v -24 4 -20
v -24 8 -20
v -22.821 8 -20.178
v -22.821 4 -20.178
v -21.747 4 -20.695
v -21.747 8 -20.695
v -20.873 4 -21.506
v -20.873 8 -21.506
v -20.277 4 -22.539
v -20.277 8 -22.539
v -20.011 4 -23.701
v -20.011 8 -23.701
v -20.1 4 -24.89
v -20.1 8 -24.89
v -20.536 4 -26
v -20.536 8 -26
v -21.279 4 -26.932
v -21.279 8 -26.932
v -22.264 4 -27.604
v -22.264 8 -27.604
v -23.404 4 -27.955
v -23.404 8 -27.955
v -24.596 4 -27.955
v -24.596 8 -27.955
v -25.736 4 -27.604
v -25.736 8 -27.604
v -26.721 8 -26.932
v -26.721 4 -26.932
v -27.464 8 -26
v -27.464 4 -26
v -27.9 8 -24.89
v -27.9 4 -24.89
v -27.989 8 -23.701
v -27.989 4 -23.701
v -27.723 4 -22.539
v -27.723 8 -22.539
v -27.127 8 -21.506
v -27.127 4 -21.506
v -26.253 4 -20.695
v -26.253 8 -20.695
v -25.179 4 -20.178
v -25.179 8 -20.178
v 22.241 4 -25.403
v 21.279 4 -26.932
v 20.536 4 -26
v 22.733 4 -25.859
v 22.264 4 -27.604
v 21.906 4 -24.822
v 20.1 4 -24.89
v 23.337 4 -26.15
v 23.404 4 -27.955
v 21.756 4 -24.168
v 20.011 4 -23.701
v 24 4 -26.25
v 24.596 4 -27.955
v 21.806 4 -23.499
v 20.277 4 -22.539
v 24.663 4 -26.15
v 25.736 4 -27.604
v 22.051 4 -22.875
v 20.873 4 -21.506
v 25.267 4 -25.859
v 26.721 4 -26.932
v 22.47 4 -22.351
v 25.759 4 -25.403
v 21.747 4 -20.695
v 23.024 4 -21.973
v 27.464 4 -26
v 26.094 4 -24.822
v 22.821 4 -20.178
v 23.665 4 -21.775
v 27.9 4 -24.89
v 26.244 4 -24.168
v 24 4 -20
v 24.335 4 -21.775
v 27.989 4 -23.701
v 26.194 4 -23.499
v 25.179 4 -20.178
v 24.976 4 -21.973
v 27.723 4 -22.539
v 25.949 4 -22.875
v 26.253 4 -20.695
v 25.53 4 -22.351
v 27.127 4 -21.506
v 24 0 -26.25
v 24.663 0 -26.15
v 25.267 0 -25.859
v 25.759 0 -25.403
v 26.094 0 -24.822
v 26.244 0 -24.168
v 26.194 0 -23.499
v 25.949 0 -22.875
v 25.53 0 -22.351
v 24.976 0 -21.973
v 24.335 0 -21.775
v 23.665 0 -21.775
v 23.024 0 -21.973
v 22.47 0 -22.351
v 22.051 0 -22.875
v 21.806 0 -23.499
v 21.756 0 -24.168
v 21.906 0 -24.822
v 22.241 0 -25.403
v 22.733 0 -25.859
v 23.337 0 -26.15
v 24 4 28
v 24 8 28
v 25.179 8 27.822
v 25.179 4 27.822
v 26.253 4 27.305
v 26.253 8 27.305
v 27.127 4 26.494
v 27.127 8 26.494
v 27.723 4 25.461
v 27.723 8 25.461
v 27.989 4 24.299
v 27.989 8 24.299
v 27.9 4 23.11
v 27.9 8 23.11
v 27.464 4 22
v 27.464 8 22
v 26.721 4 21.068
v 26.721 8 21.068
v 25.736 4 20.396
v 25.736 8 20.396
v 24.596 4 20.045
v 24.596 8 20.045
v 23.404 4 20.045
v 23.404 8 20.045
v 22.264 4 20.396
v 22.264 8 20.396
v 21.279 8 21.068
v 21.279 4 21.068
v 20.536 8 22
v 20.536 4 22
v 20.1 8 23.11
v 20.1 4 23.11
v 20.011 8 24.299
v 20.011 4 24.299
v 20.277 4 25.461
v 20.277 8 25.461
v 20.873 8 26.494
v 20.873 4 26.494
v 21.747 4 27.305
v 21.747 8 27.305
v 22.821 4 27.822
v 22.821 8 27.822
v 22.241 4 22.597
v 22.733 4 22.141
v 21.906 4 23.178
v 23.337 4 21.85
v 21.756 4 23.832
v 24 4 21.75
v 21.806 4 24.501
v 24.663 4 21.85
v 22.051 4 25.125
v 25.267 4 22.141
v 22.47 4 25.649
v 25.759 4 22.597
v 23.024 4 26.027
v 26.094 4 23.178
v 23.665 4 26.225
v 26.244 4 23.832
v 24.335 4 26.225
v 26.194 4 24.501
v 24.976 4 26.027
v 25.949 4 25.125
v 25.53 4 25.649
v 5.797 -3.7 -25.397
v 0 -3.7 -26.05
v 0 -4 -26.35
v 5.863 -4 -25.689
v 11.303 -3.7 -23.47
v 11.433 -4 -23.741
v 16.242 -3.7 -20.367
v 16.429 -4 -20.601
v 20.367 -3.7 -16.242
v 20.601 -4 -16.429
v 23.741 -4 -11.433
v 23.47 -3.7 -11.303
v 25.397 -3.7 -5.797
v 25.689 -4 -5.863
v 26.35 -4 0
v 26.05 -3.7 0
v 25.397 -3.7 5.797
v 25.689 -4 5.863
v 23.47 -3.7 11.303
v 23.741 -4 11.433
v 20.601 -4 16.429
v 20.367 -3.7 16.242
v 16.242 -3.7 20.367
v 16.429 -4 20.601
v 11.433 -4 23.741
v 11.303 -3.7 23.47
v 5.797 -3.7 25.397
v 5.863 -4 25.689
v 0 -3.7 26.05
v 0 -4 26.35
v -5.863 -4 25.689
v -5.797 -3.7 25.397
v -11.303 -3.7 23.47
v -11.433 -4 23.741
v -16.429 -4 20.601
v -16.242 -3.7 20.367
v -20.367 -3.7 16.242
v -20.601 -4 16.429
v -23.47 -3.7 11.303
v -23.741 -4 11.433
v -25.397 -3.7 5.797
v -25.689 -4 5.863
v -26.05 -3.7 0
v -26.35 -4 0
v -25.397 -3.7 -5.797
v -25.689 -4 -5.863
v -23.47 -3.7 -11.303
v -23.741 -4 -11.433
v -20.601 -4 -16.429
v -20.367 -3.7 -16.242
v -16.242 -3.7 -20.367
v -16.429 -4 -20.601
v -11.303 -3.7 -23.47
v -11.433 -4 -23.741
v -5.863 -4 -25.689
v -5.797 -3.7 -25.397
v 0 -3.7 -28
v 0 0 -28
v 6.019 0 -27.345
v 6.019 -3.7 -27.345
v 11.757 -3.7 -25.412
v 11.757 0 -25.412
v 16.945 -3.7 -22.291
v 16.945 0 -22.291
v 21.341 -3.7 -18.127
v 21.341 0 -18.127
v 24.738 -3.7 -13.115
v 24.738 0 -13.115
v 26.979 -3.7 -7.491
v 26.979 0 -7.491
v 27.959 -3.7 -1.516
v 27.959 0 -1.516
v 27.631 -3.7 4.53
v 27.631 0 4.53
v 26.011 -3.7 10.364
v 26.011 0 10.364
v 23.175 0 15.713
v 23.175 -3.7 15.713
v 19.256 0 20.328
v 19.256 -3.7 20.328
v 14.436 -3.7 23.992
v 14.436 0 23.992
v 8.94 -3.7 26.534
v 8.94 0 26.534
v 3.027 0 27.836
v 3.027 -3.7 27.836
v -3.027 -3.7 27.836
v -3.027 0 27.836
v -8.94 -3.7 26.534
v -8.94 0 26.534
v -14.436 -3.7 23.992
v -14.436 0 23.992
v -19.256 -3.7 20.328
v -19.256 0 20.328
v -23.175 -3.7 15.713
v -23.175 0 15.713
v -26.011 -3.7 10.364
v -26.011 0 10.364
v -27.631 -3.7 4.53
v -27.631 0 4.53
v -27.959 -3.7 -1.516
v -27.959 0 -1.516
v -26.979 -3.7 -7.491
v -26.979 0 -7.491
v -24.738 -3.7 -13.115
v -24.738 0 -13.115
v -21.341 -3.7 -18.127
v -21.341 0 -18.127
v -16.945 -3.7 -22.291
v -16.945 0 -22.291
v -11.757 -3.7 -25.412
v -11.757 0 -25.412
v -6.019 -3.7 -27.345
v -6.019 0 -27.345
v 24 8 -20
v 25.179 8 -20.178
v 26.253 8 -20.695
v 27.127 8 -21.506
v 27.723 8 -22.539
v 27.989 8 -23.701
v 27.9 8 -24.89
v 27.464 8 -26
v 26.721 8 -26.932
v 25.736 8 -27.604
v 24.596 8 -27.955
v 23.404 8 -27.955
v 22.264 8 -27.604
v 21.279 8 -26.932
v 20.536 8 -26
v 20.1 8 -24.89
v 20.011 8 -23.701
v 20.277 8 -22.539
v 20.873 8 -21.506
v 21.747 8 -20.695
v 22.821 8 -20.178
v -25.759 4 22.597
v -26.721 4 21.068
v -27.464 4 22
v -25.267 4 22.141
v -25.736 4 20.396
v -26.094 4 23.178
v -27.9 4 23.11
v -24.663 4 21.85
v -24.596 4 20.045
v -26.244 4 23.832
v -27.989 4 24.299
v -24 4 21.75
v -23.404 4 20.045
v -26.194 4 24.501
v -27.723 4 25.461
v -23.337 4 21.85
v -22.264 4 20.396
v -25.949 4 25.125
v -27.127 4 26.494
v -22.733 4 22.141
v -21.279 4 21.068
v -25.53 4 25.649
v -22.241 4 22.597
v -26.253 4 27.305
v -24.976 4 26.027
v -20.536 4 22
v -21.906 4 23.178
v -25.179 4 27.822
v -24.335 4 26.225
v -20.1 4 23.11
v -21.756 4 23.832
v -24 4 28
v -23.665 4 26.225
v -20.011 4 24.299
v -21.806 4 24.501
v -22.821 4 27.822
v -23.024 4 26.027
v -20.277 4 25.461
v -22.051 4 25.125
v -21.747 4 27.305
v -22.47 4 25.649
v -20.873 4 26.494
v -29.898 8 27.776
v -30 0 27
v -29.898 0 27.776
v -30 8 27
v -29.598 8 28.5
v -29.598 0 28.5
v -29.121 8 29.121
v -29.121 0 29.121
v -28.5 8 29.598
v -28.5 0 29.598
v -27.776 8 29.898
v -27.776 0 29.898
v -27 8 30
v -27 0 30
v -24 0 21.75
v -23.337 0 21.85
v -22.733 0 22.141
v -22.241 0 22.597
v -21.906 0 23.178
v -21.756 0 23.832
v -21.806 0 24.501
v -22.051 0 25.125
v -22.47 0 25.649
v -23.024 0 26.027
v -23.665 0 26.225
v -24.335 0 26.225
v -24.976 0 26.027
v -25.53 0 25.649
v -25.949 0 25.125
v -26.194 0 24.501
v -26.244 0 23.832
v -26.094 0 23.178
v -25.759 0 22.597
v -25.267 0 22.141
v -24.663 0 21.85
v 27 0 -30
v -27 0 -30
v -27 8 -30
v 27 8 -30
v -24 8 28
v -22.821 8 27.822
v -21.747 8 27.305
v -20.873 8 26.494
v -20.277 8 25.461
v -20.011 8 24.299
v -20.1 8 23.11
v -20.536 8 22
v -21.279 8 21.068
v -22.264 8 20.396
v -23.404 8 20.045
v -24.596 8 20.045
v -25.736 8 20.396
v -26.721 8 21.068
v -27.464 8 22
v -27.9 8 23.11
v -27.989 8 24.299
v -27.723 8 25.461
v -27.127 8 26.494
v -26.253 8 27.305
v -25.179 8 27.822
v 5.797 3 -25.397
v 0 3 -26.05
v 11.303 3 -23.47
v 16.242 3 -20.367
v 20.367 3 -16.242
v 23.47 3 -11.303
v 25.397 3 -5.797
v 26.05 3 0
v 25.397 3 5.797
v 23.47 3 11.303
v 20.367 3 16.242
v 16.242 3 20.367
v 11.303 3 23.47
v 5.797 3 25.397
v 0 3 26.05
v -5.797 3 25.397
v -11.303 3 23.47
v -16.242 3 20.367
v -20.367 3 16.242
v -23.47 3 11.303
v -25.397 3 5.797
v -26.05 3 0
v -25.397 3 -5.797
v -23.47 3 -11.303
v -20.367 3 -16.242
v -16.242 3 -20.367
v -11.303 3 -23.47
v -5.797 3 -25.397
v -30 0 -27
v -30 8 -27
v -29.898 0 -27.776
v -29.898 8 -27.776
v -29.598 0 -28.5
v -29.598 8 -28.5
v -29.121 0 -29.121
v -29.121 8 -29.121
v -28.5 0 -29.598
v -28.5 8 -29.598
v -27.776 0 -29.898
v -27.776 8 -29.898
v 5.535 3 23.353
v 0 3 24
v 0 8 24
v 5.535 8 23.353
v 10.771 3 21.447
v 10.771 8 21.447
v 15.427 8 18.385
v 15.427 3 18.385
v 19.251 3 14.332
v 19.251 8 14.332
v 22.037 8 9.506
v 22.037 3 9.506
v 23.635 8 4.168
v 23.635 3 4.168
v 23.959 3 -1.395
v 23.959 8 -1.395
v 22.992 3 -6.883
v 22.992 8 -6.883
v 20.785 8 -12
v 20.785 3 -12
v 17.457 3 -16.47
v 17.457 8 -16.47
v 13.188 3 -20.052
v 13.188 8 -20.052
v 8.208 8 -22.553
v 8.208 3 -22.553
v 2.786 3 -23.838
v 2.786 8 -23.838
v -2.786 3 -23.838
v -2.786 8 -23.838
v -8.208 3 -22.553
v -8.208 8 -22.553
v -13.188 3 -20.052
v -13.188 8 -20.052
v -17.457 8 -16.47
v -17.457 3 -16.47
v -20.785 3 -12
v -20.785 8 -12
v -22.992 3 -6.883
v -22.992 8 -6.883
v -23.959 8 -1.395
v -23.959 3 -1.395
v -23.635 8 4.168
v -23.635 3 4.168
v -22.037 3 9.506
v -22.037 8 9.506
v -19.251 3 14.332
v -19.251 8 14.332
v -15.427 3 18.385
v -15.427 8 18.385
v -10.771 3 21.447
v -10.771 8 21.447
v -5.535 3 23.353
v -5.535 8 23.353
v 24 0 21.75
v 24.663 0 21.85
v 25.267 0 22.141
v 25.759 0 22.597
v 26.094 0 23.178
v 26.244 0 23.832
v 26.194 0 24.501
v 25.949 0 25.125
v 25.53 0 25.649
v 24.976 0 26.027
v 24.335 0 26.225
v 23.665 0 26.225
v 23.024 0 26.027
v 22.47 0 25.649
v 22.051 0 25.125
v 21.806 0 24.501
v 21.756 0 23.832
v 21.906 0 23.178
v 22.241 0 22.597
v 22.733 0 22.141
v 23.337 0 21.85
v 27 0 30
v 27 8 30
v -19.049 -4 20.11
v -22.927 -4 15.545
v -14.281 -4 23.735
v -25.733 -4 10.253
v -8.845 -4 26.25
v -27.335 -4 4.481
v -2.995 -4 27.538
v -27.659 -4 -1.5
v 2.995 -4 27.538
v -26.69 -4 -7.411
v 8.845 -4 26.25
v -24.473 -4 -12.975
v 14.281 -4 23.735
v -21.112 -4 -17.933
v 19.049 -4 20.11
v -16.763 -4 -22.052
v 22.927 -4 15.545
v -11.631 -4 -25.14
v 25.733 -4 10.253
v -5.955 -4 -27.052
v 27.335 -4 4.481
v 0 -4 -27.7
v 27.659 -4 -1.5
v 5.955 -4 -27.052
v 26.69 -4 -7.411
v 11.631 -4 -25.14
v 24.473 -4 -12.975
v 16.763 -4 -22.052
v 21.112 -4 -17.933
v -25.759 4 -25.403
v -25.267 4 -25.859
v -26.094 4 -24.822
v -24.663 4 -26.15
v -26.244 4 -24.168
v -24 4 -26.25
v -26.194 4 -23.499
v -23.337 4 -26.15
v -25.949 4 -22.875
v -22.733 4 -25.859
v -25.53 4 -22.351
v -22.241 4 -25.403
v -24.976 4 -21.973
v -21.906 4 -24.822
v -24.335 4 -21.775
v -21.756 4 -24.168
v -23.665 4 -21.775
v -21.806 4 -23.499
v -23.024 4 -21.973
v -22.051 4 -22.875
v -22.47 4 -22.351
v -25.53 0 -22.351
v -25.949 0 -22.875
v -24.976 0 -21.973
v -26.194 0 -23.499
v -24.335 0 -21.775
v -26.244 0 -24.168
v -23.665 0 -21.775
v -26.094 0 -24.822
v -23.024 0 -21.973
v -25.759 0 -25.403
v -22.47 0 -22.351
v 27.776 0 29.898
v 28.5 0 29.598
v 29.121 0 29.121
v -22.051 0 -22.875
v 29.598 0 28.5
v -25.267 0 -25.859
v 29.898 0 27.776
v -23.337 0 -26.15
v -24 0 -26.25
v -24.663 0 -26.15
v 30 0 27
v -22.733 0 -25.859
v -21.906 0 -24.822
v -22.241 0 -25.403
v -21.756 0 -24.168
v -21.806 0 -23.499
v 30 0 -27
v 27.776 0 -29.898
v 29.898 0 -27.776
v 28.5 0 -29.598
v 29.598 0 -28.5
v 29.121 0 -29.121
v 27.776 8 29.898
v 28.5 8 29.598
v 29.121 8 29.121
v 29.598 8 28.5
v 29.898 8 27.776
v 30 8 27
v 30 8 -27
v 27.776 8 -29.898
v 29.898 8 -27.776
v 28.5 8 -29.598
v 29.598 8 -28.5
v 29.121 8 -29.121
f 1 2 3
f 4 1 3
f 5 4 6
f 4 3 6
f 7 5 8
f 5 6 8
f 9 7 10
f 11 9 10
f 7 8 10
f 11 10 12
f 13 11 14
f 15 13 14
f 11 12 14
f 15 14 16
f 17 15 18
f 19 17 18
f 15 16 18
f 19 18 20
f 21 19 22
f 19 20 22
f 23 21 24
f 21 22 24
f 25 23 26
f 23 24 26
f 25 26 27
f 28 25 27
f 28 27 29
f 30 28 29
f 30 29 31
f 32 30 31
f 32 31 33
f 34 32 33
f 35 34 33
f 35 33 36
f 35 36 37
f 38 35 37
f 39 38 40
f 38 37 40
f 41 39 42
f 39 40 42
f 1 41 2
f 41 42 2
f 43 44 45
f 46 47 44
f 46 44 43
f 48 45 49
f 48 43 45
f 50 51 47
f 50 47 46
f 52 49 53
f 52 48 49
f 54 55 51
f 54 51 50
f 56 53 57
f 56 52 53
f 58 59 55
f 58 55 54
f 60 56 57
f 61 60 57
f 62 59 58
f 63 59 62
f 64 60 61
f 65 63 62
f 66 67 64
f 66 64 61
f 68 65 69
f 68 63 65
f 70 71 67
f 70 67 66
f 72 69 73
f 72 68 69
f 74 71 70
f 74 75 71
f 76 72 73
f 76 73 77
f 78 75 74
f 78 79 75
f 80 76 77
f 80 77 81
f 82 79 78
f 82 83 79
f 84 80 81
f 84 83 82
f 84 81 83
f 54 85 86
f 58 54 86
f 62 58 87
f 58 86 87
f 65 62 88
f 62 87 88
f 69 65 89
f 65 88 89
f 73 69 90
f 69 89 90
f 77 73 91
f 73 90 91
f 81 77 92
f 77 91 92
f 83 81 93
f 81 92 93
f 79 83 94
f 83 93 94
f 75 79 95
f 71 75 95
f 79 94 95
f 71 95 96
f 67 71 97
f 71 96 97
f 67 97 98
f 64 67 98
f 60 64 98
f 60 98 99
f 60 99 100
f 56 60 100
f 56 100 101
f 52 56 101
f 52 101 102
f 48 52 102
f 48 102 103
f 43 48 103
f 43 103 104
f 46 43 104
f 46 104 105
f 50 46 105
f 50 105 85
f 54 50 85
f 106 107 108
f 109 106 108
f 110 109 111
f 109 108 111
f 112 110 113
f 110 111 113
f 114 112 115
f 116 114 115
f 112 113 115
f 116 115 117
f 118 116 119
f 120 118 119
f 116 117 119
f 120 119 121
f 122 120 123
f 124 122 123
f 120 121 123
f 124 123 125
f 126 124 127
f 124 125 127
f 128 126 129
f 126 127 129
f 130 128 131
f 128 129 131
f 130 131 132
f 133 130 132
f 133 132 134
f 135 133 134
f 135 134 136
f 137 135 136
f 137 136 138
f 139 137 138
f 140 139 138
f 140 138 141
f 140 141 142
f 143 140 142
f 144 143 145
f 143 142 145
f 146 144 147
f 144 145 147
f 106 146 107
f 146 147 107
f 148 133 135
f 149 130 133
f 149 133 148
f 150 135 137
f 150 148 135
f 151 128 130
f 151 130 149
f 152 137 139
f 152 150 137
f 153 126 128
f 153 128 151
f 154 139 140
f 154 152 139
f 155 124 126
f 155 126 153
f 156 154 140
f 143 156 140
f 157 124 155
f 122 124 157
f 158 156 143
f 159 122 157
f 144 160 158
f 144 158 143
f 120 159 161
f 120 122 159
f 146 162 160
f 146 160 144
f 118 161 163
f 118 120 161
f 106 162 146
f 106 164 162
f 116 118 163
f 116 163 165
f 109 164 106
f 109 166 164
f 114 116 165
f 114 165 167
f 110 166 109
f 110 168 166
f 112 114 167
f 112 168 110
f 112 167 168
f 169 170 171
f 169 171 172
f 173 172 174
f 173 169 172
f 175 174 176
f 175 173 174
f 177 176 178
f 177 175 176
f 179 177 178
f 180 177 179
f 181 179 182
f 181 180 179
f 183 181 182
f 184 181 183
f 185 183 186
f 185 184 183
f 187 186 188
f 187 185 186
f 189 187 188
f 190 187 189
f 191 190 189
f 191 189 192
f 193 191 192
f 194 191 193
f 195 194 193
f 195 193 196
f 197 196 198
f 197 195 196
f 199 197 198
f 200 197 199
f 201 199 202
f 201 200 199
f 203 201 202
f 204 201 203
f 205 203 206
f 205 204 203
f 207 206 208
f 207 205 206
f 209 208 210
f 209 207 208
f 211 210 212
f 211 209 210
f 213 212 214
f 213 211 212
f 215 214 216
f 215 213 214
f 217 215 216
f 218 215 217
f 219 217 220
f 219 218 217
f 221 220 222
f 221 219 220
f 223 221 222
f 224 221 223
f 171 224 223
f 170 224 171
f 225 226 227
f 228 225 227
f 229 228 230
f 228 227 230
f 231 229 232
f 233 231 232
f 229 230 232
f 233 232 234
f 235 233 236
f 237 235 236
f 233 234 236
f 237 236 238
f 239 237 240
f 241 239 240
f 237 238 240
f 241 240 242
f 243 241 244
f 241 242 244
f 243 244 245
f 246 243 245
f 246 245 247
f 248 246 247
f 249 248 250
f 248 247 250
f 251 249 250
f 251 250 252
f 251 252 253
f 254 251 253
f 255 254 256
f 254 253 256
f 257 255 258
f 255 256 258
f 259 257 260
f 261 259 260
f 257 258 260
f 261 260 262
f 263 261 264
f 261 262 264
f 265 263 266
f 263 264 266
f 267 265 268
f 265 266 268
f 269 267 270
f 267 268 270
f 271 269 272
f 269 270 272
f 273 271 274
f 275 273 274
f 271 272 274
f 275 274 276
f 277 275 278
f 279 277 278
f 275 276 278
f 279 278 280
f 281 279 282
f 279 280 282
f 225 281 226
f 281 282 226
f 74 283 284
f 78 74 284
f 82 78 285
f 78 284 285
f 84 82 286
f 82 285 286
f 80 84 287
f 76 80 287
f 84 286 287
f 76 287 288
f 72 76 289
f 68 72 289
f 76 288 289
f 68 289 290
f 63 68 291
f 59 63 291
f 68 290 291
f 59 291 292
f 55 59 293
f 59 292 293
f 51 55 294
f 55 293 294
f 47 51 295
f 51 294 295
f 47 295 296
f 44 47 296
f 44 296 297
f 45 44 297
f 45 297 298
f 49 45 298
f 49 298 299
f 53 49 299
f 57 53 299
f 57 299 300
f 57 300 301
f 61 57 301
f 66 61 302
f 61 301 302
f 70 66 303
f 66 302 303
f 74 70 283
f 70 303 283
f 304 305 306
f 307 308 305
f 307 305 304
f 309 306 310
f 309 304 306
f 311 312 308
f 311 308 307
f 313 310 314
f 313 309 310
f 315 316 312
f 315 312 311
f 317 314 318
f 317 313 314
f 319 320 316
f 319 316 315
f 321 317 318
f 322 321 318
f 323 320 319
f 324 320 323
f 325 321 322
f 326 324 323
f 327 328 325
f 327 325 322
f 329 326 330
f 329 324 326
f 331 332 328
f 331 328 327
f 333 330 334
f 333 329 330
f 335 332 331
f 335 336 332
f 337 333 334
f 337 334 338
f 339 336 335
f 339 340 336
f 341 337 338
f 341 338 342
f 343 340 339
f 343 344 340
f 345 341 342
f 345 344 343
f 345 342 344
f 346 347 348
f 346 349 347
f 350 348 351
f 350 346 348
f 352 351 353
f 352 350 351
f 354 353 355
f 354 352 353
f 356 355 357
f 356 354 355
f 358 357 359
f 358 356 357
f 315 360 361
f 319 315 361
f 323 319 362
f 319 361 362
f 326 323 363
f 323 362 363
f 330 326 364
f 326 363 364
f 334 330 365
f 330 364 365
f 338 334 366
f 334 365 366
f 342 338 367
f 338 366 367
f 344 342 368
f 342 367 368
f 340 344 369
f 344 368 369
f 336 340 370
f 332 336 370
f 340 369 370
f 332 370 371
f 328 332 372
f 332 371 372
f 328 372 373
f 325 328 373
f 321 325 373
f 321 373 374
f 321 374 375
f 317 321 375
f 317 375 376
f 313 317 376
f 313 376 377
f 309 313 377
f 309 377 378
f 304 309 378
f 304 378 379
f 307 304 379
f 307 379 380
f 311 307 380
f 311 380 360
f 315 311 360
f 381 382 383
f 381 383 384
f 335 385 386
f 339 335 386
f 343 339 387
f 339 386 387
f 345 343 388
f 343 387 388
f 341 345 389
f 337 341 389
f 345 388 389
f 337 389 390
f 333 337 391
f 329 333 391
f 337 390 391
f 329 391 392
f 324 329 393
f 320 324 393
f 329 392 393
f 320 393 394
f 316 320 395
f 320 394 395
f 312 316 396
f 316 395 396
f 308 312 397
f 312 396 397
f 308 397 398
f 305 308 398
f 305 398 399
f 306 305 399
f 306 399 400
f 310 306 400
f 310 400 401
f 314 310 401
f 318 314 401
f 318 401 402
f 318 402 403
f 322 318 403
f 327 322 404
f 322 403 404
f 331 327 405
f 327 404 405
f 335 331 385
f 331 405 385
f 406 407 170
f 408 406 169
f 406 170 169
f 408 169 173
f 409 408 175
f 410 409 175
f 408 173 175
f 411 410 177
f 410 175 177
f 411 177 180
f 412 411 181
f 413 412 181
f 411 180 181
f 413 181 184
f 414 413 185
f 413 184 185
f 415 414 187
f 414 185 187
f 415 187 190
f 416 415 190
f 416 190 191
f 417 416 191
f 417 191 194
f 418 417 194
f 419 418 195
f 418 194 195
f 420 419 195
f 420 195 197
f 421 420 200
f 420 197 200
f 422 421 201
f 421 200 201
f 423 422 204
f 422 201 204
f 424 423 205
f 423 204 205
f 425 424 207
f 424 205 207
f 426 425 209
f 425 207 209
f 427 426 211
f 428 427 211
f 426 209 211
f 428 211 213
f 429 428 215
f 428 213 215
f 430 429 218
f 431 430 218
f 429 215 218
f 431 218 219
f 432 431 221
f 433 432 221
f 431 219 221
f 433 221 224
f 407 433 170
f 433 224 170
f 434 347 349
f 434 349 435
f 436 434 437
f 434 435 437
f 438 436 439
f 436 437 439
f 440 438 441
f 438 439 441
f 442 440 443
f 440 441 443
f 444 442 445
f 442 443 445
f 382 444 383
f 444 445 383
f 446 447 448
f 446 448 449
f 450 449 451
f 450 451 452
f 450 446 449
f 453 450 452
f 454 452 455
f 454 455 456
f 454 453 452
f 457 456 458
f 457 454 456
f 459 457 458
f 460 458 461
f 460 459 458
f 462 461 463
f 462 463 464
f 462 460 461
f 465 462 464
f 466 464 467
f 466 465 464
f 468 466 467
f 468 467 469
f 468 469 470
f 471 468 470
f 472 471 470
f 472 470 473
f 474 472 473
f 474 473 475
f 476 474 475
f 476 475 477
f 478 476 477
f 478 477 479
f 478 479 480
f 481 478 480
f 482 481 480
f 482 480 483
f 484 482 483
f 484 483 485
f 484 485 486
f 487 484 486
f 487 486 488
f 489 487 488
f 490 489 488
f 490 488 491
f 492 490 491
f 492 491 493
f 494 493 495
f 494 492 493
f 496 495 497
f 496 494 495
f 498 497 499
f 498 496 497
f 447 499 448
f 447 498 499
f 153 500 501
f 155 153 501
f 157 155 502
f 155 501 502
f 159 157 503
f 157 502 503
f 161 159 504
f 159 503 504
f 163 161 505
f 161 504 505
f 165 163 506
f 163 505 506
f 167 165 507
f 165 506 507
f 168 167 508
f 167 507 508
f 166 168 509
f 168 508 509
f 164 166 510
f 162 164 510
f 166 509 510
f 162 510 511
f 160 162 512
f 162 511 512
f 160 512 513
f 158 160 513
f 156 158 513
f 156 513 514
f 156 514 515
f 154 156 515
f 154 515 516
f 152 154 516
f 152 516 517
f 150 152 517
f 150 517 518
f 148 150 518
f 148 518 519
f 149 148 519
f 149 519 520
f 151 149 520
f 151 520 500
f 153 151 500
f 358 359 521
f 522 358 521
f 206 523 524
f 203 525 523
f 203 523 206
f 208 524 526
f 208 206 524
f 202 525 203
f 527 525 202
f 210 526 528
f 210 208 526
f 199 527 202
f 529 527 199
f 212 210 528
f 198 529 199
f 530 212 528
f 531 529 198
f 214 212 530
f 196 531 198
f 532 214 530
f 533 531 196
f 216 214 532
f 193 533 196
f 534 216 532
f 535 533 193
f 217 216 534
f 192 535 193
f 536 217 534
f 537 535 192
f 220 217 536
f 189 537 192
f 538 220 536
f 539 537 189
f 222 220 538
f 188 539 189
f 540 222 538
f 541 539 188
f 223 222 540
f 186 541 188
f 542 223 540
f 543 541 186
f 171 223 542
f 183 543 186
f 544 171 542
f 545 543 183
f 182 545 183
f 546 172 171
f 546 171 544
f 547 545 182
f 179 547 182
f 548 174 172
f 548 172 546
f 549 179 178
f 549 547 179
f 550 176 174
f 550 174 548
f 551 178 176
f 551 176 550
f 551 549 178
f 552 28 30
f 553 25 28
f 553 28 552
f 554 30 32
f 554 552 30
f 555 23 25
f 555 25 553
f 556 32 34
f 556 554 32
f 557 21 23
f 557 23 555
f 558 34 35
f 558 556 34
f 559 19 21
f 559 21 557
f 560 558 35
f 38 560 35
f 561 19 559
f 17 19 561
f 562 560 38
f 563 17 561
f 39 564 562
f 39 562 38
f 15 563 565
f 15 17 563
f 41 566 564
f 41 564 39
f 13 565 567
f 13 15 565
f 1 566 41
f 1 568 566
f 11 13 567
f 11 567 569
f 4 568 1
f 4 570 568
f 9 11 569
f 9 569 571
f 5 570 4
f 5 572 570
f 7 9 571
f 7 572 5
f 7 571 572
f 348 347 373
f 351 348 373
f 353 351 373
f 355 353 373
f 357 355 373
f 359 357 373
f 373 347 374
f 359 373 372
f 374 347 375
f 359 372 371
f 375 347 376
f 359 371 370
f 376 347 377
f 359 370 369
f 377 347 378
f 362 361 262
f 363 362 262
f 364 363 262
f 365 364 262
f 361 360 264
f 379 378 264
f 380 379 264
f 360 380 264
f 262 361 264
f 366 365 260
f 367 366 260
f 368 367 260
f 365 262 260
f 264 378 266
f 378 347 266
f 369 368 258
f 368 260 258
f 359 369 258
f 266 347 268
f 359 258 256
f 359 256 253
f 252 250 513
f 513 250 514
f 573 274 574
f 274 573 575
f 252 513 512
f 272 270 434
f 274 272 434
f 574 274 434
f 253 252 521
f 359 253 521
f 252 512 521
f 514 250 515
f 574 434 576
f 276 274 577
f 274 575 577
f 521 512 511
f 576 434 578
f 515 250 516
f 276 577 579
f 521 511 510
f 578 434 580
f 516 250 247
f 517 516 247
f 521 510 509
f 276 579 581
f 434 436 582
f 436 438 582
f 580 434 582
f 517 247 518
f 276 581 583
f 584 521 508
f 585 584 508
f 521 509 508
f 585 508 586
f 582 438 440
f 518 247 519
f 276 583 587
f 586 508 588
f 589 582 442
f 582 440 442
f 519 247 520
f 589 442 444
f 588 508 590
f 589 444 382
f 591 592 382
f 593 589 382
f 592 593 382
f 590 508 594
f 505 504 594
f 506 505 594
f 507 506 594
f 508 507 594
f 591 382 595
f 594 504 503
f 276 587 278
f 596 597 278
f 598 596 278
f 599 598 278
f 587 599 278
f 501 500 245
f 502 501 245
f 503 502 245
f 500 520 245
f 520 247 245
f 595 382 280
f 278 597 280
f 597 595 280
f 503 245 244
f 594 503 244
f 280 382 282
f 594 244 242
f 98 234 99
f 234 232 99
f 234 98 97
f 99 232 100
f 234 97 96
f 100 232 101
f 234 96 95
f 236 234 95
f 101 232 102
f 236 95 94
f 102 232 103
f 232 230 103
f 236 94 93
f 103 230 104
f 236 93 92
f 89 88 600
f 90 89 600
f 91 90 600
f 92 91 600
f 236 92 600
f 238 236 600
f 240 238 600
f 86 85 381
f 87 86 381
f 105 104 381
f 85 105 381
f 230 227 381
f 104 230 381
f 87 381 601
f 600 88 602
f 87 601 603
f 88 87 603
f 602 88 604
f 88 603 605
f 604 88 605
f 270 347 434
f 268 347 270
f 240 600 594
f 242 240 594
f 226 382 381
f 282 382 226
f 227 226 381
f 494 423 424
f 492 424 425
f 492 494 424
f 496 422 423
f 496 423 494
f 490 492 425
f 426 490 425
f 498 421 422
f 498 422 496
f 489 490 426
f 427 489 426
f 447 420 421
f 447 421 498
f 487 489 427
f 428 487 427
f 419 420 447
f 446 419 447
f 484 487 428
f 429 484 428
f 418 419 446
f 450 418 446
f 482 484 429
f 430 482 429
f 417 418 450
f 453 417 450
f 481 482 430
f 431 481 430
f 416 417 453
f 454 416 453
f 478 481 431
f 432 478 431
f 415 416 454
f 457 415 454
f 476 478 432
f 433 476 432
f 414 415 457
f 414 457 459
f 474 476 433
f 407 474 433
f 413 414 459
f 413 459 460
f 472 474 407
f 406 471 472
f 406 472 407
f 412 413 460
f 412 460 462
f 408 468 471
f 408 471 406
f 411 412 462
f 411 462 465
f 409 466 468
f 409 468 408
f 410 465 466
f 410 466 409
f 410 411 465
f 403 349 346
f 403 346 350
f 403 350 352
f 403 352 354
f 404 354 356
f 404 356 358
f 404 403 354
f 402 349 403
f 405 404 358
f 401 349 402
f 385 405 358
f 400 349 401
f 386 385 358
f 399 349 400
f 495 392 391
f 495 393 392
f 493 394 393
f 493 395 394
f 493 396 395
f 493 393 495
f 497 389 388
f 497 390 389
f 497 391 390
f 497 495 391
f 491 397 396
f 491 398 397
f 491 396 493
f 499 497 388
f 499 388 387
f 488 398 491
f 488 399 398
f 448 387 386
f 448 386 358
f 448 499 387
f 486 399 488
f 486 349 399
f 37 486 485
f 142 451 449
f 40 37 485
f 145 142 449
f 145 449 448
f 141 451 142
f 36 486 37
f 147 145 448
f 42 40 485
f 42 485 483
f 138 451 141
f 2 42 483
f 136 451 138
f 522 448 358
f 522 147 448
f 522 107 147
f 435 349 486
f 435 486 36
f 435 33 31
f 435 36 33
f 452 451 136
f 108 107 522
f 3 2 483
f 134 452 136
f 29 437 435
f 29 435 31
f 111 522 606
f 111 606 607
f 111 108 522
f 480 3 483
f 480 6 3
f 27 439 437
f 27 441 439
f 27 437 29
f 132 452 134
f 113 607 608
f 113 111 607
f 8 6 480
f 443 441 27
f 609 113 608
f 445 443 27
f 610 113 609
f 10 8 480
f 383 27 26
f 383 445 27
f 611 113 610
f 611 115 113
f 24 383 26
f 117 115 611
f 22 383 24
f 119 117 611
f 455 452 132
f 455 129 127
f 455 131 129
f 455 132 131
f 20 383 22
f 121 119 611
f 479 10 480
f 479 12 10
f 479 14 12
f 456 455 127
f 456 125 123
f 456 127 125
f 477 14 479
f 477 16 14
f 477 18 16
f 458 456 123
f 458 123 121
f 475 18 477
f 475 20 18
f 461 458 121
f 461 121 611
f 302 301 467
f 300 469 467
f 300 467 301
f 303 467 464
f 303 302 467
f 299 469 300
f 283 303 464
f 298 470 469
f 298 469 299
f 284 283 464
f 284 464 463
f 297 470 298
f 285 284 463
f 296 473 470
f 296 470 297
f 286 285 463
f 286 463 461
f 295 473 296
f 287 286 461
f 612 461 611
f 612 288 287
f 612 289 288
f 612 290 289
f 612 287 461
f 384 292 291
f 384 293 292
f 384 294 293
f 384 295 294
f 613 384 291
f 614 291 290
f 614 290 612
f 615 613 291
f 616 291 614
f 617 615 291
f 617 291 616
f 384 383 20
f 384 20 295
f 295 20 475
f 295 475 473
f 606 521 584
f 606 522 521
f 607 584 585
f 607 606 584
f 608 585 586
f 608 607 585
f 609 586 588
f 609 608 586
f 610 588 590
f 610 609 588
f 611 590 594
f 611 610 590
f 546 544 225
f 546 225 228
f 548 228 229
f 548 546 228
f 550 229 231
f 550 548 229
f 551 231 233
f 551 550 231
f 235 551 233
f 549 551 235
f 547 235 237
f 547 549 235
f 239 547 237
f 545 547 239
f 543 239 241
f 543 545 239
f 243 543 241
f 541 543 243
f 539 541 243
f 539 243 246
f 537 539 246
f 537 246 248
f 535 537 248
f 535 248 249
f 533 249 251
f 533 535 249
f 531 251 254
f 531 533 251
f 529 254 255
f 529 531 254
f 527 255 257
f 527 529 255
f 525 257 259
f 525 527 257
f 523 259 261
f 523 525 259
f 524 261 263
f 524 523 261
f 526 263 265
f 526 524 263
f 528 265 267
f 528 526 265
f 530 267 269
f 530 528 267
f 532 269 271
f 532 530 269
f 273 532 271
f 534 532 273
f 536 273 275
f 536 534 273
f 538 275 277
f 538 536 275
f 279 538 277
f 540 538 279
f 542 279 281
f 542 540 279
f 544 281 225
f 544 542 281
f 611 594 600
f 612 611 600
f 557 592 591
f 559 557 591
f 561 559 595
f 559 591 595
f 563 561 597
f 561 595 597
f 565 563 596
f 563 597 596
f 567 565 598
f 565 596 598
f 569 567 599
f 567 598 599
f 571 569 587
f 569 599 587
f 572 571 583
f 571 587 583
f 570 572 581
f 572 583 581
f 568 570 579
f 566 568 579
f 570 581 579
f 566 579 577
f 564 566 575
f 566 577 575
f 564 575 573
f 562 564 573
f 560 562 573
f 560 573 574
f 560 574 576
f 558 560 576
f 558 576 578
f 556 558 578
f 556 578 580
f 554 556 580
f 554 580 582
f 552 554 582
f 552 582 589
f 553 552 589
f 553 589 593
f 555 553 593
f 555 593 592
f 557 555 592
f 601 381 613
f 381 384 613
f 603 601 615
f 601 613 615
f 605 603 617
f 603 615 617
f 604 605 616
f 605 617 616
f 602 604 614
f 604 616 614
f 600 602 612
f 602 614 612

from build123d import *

# Parameters (mm, degrees)
SKETCH_1_W          = 60
SKETCH_1_H          = 60
SKETCH_1_R          = 24
EXTRUDE_1_DEPTH     = 8
SKETCH_2_R          = 28
SKETCH_2_R_2        = 26
EXTRUDE_2_DEPTH     = 4
SKETCH_3_R          = 2.25
CUT_EXTRUDE_1_DEPTH = 44.17406629
FILLET_1_R          = 3
SKETCH_4_R          = 26.05
CUT_EXTRUDE_2_DEPTH = 7
SKETCH_5_R          = 4
CUT_EXTRUDE_3_DEPTH = 4
CHAMFER_1_SIZE      = 0.3


with BuildPart() as part:
    # Эскиз1 → Бобышка-Вытянуть1 (new body)
    with BuildSketch(Plane(origin=(0, 0, 0), x_dir=(1, 0, 0), z_dir=(0, 1, 0))):
        Rectangle(SKETCH_1_W, SKETCH_1_H)
        with Locations(Location((0, 0, 0), (0, 0, 270))):
            Circle(SKETCH_1_R, mode=Mode.SUBTRACT)
    extrude(amount=EXTRUDE_1_DEPTH)

    # Эскиз2 → Бобышка-Вытянуть2 (add)
    with BuildSketch(Plane.XZ):
        with Locations(Location((0, 0, 0), (0, 0, 270))):
            Circle(SKETCH_2_R)
        with Locations(Location((0, 0, 0), (0, 0, 270))):
            Circle(SKETCH_2_R_2, mode=Mode.SUBTRACT)
    extrude(amount=EXTRUDE_2_DEPTH)

    # Эскиз3 → Вырез-Вытянуть1 (cut, through all)
    with BuildSketch(Plane(origin=(0, 0, 0), x_dir=(-1, 0, 0), z_dir=(0, -1, 0))):
        with Locations(Location((24, -24, 0), (0, 0, 90))):
            Circle(SKETCH_3_R)
        with Locations(Location((-24, -24, 0), (0, 0, 90))):
            Circle(SKETCH_3_R)
        with Locations(Location((-24, 24, 0), (0, 0, 90))):
            Circle(SKETCH_3_R)
        with Locations(Location((24, 24, 0), (0, 0, 90))):
            Circle(SKETCH_3_R)
    extrude(amount=-CUT_EXTRUDE_1_DEPTH, mode=Mode.SUBTRACT)

    # Скругление1
    fillet_1_edges = [part.edges().sort_by_distance(p)[0] for p in [
        (30, 4, 30),
        (-30, 4, 30),
        (-30, 4, -30),
        (30, 4, -30),
    ]]
    fillet(fillet_1_edges, radius=FILLET_1_R)

    # Эскиз4 → Вырез-Вытянуть2 (cut)
    with BuildSketch(Plane.XZ.offset(4)):
        with Locations(Location((0, 0, 0), (0, 0, 270))):
            Circle(SKETCH_4_R)
    extrude(amount=-CUT_EXTRUDE_2_DEPTH, mode=Mode.SUBTRACT)

    # Эскиз5 → Вырез-Вытянуть3 (cut)
    with BuildSketch(Plane(origin=(0, 8, 0), x_dir=(1, 0, 0), z_dir=(0, 1, 0))):
        with Locations(Location((-24, 24, 0), (0, 0, 270))):
            Circle(SKETCH_5_R)
        with Locations(Location((24, 24, 0), (0, 0, 270))):
            Circle(SKETCH_5_R)
        with Locations(Location((24, -24, 0), (0, 0, 270))):
            Circle(SKETCH_5_R)
        with Locations(Location((-24, -24, 0), (0, 0, 270))):
            Circle(SKETCH_5_R)
    extrude(amount=-CUT_EXTRUDE_3_DEPTH, mode=Mode.SUBTRACT)

    # Фаска1
    chamfer_1_edges = [part.edges().sort_by_distance(p)[0] for p in [
        (0, -4, 28),
        (0, -4, 26.05),
    ]]
    chamfer(chamfer_1_edges, length=CHAMFER_1_SIZE)


solid = part.part
